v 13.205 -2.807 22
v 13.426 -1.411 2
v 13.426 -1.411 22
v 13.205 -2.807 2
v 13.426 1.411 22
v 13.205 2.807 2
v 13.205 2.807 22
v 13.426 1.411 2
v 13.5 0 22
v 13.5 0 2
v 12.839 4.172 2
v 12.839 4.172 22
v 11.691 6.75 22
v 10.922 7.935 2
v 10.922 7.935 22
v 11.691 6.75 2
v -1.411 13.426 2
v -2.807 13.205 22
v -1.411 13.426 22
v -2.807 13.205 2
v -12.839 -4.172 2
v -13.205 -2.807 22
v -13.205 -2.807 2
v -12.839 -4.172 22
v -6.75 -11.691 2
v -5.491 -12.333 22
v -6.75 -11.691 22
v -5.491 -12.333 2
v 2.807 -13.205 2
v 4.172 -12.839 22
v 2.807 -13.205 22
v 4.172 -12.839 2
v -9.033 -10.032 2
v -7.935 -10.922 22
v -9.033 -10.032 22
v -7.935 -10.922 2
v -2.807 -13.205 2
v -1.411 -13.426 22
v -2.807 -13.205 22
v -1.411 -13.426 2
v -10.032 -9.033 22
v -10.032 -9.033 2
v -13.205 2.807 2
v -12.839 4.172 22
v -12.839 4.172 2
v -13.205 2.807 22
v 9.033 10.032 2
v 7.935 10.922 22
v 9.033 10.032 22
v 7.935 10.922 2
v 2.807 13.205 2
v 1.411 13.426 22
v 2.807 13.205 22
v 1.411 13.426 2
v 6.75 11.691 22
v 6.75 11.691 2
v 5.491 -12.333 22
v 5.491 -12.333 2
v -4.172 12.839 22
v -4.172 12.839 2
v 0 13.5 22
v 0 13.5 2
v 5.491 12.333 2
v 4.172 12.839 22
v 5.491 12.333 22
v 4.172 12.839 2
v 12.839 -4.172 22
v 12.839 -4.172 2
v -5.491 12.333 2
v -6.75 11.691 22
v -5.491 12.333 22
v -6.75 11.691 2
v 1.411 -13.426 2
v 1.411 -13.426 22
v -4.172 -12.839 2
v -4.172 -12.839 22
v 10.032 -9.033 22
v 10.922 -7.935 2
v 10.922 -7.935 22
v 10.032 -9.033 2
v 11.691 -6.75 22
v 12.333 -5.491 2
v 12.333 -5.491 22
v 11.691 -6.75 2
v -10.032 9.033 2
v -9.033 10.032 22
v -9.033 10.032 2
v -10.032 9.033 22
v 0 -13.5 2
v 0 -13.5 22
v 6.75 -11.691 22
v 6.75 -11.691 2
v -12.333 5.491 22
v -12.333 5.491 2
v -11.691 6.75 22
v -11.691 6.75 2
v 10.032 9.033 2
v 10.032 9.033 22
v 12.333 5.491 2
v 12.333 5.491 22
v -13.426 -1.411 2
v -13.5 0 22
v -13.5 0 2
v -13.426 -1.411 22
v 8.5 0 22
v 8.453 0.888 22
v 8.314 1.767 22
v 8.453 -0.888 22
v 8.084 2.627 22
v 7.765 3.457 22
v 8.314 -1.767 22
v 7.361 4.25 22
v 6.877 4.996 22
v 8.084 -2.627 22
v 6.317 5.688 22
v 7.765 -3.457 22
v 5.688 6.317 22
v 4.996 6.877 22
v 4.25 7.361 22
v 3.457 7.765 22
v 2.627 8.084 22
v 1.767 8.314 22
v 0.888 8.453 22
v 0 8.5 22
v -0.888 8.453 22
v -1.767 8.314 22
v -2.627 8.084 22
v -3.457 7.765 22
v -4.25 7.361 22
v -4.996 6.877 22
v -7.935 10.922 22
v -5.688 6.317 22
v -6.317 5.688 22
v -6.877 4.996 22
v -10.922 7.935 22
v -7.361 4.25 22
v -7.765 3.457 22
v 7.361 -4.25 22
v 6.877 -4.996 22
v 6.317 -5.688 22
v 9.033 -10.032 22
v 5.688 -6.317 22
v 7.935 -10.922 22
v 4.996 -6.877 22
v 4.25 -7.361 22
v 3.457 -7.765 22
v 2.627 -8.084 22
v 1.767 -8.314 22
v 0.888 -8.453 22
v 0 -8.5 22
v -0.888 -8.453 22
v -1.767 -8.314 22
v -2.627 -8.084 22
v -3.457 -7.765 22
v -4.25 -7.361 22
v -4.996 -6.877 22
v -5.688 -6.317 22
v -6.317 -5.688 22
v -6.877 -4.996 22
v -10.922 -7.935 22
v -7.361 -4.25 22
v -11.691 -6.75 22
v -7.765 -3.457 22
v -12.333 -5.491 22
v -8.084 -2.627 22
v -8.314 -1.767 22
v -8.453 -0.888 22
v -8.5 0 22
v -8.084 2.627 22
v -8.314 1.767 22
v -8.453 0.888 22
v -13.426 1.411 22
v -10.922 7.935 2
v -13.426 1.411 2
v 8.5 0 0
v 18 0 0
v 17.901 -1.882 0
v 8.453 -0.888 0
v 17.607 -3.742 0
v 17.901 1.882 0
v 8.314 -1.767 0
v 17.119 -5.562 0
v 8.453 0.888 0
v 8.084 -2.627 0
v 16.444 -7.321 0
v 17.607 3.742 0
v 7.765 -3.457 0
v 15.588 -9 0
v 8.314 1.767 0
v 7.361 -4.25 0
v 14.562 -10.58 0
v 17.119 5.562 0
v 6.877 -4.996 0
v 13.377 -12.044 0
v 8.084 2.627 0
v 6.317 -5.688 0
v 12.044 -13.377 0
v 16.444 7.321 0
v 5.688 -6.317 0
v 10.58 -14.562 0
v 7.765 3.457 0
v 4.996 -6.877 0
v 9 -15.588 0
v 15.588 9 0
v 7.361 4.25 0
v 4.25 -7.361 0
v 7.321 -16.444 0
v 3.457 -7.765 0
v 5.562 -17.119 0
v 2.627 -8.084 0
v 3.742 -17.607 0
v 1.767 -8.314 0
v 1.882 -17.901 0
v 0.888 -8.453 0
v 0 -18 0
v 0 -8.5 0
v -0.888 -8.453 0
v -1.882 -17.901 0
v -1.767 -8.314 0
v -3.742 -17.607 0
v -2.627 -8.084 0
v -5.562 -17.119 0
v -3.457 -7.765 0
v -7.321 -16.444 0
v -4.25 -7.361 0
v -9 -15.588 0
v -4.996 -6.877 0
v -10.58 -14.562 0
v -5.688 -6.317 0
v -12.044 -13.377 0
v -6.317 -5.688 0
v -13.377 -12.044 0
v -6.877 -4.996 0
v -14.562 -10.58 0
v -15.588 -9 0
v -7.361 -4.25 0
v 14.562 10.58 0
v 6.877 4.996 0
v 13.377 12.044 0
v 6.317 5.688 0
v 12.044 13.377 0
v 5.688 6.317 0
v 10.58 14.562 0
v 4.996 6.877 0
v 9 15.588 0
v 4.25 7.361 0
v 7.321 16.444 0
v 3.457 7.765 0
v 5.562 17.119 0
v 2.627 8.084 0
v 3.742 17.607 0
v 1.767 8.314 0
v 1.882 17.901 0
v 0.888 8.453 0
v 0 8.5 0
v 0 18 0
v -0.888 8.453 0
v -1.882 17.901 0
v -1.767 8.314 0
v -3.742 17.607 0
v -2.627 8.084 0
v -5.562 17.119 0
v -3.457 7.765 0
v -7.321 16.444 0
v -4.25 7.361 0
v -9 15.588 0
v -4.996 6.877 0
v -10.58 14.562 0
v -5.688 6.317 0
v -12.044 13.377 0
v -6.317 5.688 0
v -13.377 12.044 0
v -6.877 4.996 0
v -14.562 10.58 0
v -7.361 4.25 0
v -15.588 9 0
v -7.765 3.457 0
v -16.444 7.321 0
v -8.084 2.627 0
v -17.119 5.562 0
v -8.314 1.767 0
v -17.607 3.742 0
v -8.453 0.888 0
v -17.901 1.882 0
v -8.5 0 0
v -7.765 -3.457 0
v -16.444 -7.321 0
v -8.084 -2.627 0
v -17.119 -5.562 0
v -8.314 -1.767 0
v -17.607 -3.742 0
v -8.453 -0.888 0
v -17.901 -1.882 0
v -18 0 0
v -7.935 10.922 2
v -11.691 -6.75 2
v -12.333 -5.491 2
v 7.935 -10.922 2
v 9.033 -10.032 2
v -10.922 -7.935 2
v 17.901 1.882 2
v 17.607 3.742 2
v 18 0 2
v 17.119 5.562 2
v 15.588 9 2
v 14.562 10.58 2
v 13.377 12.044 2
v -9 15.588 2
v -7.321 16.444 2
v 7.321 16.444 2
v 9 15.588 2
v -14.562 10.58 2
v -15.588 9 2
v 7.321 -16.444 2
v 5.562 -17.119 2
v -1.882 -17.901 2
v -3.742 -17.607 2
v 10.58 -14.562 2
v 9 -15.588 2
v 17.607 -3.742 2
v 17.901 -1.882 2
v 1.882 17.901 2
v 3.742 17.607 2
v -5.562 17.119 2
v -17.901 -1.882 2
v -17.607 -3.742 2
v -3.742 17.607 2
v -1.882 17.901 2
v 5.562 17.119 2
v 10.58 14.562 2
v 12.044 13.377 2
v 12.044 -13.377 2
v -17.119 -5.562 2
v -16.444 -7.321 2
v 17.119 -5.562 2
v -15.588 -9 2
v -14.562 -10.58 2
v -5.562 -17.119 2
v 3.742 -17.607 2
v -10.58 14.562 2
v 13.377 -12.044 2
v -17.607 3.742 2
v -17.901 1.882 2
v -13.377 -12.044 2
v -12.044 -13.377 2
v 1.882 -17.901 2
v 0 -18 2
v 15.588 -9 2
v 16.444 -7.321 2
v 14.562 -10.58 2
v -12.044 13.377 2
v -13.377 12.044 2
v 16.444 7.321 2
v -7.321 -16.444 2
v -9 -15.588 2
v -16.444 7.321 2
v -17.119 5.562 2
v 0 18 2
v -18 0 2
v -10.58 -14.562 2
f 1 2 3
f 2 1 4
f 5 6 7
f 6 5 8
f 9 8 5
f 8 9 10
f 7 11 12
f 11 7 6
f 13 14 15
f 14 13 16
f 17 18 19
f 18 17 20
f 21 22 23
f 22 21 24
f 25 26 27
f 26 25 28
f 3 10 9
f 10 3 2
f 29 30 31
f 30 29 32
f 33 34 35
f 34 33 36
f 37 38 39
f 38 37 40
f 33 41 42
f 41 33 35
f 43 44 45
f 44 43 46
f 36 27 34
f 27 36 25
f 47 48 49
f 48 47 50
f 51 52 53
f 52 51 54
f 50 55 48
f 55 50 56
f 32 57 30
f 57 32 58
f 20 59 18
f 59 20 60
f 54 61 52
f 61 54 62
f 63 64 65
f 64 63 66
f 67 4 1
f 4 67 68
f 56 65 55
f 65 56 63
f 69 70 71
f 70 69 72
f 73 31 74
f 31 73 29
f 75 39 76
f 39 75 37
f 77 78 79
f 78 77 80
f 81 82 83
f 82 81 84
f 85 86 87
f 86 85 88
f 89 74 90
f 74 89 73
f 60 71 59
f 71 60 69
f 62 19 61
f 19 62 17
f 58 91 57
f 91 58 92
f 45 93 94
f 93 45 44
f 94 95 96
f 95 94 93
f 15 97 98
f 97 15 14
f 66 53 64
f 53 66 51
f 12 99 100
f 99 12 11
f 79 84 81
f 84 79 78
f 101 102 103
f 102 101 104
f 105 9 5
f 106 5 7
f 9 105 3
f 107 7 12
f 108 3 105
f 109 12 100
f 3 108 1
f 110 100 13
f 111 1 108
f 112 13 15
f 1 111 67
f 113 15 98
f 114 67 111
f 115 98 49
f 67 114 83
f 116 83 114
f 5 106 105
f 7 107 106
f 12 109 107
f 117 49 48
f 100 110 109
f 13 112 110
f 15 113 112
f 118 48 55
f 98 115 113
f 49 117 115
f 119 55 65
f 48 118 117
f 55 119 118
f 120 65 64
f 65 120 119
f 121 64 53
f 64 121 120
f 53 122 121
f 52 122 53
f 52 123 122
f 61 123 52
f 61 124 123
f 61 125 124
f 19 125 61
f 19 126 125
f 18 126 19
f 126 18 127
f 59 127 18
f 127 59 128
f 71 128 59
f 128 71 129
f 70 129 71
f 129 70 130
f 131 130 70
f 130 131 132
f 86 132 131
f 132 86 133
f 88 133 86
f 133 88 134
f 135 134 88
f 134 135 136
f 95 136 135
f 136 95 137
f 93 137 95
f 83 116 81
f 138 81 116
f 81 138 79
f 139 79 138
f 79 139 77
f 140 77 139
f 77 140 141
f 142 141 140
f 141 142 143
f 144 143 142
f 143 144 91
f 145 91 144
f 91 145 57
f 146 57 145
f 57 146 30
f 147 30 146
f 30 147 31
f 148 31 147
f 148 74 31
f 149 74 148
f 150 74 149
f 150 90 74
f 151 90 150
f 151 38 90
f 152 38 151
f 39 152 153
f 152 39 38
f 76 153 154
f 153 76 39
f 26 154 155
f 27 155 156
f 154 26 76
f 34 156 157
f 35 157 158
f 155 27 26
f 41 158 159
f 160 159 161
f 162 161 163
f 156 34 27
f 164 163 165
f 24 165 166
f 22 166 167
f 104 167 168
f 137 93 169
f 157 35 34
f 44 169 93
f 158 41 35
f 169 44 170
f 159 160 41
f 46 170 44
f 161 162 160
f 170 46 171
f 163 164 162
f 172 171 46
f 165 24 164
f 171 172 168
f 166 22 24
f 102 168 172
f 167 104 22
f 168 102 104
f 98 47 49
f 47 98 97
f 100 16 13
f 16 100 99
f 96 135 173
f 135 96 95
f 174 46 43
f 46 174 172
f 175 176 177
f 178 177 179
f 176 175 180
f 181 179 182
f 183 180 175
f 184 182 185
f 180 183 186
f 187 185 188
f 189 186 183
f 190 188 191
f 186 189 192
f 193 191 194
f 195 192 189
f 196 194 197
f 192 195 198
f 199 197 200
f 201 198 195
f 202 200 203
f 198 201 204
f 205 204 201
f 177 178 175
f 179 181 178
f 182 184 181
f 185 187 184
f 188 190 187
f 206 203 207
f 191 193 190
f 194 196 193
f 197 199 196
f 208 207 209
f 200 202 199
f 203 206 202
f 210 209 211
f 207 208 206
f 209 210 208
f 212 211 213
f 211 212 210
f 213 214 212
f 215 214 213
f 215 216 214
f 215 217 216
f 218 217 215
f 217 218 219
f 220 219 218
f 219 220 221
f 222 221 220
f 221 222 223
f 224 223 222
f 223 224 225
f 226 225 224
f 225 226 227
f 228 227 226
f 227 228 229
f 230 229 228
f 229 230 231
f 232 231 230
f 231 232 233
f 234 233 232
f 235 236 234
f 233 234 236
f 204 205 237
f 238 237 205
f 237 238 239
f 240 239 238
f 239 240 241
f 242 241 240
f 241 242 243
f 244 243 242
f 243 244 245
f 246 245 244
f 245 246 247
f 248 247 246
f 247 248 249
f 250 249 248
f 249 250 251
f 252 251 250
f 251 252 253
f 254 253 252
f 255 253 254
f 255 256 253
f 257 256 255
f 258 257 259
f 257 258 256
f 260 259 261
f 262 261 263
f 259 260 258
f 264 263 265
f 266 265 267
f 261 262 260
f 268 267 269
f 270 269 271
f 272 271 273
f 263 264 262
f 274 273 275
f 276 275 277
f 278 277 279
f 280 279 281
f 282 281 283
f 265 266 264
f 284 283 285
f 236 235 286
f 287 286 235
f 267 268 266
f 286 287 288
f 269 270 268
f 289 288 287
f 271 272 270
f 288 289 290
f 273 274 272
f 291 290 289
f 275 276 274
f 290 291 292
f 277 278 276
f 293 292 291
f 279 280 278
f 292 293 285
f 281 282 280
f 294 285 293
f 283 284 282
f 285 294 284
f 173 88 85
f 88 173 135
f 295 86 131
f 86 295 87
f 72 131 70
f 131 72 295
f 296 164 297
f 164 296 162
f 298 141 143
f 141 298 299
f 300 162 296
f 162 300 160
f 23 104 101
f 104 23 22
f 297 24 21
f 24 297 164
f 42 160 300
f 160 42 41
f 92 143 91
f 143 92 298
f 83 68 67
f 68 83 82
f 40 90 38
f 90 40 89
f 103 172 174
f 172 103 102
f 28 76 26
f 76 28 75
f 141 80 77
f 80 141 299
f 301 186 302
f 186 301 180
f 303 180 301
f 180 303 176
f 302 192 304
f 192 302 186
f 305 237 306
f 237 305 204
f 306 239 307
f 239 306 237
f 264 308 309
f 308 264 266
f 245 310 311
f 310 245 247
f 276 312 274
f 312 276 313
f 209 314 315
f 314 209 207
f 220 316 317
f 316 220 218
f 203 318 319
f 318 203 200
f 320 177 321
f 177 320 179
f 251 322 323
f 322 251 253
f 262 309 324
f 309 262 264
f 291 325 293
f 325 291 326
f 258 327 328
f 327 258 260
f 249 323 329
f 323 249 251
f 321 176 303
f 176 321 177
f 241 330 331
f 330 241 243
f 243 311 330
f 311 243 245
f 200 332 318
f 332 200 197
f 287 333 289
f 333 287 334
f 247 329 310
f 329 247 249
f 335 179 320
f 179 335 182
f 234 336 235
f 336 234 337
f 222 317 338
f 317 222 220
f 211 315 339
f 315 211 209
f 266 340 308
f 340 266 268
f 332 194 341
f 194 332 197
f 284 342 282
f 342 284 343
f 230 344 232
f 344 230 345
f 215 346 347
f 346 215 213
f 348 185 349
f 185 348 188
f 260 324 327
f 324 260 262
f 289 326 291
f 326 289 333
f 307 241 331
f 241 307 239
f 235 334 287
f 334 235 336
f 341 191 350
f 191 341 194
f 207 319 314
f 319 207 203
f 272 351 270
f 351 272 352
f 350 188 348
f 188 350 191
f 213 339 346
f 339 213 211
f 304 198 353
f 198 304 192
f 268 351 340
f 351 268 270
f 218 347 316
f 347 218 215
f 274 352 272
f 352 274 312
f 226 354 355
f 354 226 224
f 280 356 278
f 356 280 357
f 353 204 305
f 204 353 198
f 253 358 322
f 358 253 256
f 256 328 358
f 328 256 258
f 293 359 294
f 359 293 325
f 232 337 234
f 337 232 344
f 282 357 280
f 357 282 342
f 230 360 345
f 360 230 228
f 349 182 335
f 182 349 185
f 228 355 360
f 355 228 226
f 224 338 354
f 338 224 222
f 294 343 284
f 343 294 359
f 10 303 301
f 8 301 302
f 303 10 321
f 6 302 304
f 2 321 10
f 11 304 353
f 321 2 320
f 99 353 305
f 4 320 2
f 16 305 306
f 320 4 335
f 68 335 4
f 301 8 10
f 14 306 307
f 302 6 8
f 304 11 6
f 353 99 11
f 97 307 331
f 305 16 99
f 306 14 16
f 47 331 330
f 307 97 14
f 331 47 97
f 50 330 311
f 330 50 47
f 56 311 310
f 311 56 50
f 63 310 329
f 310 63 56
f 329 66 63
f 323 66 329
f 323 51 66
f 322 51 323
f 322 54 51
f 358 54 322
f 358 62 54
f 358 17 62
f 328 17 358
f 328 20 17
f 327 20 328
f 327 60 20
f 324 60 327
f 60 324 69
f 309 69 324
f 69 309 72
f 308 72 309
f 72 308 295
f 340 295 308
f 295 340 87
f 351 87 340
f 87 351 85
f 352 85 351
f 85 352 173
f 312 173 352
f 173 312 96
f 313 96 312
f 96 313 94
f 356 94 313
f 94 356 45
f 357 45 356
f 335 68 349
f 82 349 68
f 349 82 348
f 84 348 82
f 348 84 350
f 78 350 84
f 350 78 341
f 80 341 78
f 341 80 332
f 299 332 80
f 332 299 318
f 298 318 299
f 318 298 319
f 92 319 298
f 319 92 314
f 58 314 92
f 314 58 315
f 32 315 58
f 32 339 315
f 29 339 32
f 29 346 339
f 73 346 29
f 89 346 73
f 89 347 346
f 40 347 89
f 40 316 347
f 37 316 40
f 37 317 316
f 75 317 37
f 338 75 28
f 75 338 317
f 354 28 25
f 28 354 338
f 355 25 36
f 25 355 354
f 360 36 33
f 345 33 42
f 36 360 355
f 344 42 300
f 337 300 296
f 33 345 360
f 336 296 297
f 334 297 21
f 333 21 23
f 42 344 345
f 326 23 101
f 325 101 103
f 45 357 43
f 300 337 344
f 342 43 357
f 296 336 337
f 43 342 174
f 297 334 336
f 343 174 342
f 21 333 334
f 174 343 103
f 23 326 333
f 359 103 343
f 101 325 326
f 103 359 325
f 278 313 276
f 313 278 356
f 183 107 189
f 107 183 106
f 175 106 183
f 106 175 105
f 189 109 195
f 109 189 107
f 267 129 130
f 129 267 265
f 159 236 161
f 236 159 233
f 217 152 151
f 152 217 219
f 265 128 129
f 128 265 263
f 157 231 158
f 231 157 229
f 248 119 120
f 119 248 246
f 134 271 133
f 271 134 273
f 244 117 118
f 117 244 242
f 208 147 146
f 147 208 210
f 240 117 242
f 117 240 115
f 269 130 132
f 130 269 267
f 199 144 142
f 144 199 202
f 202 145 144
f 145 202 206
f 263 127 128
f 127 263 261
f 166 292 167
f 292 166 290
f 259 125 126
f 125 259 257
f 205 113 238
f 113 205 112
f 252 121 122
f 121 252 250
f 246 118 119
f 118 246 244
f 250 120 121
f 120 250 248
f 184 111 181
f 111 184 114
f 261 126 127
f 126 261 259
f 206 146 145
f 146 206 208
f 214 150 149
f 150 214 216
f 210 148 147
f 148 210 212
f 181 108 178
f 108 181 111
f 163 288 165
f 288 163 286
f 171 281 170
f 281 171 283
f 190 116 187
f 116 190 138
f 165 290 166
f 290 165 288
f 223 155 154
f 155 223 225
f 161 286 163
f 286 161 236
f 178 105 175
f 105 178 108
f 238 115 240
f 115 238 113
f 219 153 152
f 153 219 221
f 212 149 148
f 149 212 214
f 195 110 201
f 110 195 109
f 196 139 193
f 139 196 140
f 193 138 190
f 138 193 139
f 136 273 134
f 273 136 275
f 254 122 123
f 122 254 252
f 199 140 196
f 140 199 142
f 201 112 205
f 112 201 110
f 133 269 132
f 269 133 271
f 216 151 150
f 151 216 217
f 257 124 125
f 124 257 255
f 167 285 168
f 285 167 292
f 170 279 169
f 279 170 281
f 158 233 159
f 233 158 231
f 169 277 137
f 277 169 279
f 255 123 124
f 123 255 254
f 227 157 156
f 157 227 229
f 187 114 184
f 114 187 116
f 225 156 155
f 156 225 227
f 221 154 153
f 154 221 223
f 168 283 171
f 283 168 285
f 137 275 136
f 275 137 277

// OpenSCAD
// Flanged threaded insert.
$fn = 60;
eps = 0.02;
inner_d = 17;
outer_d = 27;
length = 22;
flange_d = 36;
difference() {
    union() { cylinder(d=outer_d,h=length); cylinder(d=flange_d,h=2); }
    translate([0,0,-eps]) cylinder(d=inner_d,h=length+2*eps);
}
